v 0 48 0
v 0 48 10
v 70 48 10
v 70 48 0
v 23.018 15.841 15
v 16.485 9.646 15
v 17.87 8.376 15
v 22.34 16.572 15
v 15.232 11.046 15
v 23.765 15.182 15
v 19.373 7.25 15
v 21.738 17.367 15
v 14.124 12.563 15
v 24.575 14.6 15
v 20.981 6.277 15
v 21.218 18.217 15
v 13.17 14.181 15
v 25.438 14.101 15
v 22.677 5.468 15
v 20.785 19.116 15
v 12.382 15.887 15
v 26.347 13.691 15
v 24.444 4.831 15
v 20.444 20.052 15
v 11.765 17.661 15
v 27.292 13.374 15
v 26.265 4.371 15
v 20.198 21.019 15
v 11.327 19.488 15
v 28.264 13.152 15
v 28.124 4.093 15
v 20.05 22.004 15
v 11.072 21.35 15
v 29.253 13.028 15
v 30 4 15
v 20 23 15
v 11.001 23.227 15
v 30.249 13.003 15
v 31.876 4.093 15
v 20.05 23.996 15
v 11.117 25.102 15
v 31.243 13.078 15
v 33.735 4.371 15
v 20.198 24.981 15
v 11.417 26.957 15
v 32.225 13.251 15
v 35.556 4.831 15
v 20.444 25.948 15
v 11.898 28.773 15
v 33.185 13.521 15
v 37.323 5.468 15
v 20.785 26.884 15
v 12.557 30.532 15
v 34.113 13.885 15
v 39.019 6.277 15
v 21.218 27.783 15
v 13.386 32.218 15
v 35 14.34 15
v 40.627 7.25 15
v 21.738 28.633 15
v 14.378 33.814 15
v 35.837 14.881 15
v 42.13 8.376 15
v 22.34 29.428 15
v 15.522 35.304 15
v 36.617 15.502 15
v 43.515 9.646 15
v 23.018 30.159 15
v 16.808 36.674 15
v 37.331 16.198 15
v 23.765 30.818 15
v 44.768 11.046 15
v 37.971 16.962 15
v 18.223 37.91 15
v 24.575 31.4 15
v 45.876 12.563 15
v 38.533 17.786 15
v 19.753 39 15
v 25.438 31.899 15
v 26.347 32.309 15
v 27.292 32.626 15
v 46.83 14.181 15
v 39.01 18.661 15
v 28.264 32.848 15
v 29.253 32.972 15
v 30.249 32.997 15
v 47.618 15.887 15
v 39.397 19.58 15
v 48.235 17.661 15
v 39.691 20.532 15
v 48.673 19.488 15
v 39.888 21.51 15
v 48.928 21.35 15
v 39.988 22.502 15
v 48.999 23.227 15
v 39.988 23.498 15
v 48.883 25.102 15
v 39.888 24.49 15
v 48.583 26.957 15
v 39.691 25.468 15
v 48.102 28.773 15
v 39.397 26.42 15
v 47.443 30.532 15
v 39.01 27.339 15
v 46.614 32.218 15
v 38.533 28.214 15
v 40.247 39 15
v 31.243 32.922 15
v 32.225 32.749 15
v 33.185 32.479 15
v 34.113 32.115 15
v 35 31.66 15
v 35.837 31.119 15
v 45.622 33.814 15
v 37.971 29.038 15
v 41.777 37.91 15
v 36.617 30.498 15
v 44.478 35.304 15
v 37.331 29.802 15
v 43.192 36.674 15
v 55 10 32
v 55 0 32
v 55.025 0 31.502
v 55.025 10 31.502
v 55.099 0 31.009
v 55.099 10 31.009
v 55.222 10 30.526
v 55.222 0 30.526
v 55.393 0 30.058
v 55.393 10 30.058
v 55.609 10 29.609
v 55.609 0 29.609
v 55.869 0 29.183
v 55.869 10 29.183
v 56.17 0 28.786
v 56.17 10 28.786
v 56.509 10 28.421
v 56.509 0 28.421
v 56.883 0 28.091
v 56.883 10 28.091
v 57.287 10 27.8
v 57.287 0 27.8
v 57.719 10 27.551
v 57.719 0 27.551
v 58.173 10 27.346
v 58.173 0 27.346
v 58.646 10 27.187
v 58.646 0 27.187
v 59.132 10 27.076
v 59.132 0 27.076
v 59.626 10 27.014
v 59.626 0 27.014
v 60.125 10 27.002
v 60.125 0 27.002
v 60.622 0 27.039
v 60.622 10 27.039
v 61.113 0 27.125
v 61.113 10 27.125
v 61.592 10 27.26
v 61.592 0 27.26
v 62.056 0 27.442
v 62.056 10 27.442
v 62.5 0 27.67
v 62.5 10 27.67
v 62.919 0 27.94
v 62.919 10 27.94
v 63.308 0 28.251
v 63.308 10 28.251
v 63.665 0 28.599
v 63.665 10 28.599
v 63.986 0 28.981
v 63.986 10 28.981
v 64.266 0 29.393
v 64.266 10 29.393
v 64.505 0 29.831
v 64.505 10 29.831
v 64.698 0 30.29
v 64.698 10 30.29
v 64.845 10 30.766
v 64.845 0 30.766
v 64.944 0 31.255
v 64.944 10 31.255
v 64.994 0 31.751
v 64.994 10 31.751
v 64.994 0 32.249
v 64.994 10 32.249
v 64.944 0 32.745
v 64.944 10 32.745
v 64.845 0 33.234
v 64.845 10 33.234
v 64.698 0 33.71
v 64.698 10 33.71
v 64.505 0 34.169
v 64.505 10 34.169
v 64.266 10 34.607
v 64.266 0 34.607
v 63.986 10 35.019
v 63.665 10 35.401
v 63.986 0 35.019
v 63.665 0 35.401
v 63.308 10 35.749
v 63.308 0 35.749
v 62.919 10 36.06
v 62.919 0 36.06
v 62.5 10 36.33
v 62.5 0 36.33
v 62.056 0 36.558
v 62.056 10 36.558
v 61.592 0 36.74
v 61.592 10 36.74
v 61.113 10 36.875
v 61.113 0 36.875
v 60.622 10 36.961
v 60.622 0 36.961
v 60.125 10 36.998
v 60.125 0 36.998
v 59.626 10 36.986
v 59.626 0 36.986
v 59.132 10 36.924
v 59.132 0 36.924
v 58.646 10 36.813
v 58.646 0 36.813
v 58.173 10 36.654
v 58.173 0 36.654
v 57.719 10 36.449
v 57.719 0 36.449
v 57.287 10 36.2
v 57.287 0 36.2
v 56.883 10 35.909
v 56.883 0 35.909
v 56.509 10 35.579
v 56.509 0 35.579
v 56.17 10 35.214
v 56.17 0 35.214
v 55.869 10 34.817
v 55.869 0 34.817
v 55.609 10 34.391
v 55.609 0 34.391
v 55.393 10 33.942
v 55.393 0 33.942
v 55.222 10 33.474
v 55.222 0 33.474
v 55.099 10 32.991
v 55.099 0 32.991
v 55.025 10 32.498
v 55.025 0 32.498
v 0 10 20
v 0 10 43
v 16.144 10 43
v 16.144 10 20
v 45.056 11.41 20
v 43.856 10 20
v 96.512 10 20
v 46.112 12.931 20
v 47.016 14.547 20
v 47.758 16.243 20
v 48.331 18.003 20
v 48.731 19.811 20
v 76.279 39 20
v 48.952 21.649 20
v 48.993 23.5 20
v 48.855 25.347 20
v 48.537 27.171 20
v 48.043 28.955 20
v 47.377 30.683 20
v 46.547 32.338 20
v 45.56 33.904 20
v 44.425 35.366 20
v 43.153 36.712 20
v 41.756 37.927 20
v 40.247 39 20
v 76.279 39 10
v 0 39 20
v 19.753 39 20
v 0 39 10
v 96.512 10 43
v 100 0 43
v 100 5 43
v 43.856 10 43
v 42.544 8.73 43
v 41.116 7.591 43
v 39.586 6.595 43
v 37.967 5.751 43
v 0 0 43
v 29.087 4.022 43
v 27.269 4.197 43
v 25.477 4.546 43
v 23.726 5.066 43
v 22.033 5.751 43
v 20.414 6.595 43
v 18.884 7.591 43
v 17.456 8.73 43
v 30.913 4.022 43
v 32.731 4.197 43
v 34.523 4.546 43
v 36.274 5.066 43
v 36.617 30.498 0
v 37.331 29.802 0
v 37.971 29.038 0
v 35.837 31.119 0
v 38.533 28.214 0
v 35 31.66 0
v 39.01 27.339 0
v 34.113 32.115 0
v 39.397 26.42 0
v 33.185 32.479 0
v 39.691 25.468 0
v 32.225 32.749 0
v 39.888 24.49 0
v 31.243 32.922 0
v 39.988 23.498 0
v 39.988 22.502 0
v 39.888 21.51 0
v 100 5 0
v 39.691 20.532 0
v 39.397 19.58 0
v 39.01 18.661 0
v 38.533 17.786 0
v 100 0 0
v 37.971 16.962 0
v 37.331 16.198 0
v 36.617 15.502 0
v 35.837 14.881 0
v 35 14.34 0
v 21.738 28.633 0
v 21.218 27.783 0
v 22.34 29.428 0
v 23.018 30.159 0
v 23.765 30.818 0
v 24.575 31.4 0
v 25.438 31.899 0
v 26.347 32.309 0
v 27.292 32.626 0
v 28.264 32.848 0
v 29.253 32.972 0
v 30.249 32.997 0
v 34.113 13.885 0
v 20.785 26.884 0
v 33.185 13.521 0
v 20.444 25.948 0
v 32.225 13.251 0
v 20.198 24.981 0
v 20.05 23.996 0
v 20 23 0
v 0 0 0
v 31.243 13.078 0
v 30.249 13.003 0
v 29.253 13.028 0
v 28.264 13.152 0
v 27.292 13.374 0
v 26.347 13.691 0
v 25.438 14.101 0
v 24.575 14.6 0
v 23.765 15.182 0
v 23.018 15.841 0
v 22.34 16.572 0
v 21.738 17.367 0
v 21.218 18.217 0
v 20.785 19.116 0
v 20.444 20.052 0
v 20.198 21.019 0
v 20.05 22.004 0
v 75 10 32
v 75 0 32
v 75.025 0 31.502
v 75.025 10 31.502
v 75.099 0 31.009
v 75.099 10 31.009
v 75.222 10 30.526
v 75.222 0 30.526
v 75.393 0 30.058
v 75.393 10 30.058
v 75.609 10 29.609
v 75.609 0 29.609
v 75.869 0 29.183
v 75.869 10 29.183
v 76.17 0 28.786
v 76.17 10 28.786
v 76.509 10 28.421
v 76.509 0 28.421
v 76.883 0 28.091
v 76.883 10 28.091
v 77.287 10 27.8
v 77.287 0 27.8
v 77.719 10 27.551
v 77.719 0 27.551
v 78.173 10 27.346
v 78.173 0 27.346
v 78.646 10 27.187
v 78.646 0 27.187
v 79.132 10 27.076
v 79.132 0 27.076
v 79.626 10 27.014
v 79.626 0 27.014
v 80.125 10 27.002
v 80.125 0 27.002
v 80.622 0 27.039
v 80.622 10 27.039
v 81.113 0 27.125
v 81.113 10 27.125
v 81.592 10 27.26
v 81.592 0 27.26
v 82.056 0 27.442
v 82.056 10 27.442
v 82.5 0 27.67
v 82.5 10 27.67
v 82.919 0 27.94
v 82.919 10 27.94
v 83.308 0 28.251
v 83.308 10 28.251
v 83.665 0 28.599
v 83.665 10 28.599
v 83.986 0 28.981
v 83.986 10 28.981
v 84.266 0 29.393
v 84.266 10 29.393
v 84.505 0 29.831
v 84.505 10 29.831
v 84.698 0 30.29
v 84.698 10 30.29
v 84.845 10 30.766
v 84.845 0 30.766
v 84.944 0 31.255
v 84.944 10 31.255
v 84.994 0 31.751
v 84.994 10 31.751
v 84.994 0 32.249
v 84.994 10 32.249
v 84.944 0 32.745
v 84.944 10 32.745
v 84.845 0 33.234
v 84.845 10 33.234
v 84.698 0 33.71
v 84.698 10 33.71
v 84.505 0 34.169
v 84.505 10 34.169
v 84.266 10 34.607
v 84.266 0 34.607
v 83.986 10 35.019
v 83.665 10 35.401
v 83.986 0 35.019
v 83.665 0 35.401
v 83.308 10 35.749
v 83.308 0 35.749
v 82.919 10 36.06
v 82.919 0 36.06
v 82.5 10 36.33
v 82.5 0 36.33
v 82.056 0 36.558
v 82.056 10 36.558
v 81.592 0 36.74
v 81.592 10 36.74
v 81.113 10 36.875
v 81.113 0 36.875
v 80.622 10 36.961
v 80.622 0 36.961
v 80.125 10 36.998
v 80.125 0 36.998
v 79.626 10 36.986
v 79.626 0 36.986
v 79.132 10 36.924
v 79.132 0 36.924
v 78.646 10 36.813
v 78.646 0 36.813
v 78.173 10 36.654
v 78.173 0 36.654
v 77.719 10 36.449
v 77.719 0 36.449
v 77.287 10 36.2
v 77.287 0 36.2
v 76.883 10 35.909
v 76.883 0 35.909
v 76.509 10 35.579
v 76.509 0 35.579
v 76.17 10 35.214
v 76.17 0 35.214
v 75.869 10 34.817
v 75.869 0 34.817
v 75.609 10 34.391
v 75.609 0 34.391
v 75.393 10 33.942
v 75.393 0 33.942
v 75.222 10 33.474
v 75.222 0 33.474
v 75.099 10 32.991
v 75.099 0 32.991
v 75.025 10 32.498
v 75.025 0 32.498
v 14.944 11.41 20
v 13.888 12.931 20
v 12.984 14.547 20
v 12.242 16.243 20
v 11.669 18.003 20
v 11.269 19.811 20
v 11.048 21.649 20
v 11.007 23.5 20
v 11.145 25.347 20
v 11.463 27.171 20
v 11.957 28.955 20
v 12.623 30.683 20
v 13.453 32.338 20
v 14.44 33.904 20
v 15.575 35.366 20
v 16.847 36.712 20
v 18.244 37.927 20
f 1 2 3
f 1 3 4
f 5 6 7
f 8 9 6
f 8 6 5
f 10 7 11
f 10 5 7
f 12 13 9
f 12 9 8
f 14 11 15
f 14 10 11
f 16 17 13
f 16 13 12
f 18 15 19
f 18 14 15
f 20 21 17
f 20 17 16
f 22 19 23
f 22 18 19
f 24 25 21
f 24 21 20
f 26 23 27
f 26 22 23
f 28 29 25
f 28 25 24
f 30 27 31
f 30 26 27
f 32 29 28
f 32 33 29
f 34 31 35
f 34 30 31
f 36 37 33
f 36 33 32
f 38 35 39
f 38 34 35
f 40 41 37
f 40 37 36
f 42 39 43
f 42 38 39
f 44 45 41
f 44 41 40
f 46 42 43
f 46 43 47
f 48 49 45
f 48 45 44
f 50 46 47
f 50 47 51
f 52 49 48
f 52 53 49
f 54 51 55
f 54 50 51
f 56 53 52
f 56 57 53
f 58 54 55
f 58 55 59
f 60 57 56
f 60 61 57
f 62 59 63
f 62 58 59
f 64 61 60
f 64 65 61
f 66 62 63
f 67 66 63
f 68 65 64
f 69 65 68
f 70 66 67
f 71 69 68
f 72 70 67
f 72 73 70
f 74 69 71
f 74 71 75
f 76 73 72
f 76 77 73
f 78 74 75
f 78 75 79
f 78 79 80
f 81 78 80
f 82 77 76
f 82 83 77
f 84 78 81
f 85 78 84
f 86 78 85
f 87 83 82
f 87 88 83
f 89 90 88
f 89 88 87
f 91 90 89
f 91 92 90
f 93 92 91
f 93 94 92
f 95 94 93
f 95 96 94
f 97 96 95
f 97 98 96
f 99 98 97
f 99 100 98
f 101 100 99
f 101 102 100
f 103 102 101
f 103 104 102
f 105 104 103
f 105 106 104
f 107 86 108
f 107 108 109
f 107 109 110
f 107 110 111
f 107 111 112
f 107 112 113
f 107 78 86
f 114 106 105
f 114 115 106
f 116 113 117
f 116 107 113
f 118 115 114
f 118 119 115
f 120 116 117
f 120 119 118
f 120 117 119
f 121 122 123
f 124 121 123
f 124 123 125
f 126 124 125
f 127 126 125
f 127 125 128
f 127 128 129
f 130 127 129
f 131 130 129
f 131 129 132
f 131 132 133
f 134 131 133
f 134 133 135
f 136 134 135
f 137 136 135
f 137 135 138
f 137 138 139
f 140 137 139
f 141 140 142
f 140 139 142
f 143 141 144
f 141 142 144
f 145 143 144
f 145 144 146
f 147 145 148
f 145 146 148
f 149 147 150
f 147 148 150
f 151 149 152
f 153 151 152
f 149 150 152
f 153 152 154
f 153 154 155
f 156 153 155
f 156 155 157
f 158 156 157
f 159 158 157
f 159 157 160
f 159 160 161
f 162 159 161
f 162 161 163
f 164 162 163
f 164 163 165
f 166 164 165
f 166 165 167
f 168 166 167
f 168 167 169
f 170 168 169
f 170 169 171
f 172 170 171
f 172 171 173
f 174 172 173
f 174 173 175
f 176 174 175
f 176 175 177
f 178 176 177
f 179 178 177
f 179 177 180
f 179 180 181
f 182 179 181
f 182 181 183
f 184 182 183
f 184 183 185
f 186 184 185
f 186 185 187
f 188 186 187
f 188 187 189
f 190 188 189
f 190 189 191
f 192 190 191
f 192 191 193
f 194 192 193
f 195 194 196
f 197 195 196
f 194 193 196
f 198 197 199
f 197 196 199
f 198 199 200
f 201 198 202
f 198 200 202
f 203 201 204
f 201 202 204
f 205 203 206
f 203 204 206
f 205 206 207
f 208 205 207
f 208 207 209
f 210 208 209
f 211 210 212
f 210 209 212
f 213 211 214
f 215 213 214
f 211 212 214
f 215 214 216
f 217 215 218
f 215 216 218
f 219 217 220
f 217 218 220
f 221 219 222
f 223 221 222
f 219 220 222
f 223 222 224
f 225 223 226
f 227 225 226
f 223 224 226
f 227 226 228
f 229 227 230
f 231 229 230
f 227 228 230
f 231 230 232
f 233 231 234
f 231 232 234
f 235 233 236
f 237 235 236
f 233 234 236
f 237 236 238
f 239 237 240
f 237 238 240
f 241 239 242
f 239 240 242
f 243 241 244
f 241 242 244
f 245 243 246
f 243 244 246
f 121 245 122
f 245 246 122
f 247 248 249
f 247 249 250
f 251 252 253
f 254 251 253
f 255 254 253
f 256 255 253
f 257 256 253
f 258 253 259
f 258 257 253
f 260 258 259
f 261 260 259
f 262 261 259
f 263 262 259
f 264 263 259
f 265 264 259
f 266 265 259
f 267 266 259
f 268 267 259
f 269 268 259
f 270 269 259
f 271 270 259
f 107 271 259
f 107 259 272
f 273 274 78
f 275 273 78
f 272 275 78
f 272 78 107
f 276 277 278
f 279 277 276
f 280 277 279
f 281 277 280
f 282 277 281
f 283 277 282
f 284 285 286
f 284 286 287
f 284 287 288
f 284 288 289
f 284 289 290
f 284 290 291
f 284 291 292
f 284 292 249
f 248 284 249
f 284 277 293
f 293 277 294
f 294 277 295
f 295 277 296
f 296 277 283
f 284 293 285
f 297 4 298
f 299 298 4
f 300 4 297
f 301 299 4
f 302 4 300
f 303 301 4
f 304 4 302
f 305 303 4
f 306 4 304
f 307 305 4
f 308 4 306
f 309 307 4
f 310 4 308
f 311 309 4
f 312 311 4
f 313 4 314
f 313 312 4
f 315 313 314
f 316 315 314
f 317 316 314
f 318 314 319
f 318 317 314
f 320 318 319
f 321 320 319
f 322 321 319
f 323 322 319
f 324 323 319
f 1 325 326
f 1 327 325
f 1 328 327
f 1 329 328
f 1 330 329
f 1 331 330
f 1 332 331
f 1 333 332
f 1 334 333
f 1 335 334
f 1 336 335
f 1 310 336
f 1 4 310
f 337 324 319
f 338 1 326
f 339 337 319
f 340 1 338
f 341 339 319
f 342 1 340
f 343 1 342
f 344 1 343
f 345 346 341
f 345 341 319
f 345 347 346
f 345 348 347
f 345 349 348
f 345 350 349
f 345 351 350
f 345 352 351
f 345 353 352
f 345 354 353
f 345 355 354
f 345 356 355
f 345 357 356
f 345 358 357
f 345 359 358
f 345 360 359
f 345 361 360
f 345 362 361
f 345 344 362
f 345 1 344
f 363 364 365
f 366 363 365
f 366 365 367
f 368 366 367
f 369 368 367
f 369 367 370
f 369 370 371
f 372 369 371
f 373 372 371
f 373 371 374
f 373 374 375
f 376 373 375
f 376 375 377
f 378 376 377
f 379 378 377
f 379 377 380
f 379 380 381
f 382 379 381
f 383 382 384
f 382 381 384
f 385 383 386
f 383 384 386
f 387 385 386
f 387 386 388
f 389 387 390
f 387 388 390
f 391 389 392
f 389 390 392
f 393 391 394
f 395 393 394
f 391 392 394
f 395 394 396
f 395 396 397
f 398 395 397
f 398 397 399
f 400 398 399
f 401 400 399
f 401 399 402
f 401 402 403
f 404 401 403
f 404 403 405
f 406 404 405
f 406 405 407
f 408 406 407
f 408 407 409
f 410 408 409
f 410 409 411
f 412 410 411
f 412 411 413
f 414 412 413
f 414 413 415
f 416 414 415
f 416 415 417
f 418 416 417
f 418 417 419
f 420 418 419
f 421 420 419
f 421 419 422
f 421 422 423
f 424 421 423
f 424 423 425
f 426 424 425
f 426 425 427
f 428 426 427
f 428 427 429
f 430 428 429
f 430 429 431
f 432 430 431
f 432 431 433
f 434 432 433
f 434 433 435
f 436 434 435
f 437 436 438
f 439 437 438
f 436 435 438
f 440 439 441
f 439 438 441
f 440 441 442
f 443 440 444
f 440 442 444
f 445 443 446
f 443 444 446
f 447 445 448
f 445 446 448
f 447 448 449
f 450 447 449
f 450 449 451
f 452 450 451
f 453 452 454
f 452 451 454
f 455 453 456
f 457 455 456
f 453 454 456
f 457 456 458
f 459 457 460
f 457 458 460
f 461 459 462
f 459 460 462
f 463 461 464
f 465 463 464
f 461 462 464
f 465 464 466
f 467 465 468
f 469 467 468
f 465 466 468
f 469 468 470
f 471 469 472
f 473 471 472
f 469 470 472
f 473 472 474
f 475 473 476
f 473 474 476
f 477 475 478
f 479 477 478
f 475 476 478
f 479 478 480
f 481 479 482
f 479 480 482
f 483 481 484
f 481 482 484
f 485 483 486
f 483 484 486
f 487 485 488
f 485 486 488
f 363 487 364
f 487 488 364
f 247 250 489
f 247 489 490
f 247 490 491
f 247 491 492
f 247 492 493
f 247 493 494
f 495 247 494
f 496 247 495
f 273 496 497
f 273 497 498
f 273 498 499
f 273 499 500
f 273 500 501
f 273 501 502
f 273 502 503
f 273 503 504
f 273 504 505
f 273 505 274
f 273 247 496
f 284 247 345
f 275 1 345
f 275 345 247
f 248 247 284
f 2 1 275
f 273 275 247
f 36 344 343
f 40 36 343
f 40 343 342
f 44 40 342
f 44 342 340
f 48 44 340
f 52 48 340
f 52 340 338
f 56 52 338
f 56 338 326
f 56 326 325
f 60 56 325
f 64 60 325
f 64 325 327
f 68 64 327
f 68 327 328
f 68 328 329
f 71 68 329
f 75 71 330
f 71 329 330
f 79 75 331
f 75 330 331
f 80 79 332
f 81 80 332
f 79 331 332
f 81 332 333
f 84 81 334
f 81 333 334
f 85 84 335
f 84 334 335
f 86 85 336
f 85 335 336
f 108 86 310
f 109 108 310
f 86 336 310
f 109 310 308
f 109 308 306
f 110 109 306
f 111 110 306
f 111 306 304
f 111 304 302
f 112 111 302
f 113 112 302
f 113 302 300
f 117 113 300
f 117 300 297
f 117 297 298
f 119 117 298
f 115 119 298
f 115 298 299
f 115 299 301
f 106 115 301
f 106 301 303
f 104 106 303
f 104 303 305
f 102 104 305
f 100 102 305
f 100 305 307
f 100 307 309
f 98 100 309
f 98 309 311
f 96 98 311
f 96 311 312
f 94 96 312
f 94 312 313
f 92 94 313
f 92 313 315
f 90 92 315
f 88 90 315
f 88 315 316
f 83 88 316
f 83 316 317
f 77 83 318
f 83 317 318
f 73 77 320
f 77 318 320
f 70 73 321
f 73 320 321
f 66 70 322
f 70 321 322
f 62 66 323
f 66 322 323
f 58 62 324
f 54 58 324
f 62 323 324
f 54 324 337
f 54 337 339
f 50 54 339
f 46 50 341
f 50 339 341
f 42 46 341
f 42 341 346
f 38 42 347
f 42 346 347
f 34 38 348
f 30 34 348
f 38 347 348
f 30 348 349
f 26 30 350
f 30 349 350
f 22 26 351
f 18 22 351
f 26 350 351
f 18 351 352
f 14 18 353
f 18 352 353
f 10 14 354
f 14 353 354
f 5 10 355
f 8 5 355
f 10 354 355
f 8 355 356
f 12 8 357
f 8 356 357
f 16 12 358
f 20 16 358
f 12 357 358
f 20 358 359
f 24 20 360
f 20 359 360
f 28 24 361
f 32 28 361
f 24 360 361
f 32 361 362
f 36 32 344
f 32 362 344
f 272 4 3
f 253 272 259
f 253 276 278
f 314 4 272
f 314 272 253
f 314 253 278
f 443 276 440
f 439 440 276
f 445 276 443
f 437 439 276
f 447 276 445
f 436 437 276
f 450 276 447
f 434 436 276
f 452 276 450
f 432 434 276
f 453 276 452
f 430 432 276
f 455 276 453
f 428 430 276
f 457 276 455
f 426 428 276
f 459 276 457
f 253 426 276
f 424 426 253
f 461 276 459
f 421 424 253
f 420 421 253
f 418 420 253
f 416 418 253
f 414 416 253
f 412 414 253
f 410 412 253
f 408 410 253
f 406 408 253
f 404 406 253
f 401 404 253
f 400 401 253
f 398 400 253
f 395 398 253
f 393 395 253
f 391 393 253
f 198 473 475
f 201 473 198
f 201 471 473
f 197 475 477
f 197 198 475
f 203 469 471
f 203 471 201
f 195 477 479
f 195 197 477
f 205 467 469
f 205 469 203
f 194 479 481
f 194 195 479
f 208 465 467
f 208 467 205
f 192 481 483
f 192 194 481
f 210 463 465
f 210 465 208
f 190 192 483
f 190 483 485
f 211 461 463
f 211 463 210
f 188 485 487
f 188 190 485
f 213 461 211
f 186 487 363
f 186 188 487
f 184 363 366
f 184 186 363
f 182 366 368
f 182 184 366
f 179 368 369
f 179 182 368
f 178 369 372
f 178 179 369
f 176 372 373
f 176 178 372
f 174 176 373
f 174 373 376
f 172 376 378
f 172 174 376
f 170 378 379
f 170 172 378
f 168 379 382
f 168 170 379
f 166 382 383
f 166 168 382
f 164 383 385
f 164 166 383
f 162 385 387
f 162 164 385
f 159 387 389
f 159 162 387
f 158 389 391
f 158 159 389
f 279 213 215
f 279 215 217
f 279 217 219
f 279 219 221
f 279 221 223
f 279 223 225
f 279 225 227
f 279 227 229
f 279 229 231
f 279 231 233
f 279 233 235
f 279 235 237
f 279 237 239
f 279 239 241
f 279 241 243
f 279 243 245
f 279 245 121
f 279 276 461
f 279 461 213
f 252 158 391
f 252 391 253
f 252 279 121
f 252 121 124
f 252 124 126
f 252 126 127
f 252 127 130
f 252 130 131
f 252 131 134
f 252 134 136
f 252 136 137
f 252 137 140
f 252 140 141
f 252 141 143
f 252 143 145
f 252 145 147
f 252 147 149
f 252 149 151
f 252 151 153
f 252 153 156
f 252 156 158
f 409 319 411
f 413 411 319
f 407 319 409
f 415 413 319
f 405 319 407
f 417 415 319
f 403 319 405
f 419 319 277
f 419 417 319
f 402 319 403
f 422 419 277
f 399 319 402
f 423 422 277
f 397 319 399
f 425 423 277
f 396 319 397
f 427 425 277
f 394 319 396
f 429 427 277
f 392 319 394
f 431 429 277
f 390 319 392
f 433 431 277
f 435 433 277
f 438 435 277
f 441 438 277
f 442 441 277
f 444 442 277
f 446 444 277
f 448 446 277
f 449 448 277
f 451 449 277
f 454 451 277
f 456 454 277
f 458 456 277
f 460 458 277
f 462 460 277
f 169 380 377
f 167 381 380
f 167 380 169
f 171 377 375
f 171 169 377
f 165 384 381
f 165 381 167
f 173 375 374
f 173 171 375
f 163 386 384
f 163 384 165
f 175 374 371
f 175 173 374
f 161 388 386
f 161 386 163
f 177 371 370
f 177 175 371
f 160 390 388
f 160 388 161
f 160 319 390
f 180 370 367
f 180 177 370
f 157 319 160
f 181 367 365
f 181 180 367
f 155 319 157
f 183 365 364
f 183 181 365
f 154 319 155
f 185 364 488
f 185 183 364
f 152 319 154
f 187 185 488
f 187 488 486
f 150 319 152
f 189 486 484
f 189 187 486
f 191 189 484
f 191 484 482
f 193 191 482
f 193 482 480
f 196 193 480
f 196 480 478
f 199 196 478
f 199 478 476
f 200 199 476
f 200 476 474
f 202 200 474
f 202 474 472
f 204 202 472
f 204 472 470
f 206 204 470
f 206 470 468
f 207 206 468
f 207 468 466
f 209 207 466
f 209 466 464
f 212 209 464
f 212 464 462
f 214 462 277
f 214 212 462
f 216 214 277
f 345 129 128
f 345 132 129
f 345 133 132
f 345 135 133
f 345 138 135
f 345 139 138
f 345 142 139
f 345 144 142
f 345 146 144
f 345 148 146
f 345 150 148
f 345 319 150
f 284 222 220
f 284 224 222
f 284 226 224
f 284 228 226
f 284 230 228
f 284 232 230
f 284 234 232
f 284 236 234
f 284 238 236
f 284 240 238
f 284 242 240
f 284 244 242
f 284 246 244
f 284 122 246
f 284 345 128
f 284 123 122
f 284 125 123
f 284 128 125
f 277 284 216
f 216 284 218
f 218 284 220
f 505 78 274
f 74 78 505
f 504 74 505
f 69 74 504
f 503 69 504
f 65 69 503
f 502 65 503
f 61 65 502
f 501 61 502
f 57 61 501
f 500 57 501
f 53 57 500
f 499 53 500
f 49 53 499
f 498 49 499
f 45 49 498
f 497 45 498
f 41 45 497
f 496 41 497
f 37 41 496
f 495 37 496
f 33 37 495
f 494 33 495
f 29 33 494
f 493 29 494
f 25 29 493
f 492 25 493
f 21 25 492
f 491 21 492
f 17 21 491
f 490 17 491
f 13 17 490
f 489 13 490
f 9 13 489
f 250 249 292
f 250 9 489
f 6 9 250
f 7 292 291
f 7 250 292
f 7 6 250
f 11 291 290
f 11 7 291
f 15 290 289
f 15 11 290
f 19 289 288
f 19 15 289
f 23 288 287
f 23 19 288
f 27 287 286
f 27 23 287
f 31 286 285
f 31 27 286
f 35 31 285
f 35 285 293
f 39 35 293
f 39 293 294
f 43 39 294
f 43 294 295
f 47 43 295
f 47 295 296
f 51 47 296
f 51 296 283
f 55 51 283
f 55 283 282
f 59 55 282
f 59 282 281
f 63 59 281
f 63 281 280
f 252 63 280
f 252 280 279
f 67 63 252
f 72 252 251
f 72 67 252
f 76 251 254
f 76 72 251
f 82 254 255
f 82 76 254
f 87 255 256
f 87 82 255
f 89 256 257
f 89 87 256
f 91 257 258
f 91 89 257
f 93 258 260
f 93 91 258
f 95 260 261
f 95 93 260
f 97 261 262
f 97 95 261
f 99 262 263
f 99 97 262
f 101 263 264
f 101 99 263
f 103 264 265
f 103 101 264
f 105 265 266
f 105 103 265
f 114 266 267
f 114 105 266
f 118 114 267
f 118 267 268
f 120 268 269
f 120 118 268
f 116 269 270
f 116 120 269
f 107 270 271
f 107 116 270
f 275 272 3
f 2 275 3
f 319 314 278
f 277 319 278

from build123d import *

# Parameters (mm, degrees)
ESTRUSIONE_ESTRUSIONE1_DEPTH  = 100
TAGLIO_ESTRUSIONE1_DEPTH      = 119.966381806
TAGLIO_ESTRUSIONE1_DEPTH_BACK = 119.966381806
TAGLIO_ESTRUSIONE2_DEPTH      = 142.966381806
TAGLIO_ESTRUSIONE2_DEPTH_BACK = 5
TAGLIO_ESTRUSIONE2_START      = -23
SCHIZZO3_R                    = 19
FORO_20_0_20_1_D              = 20
FORO_10_0_10_1_D              = 10


with BuildPart() as part:
    # Schizzo1 → Estrusione-Estrusione1 (new body)
    with BuildSketch(Plane(origin=(0, 0, 0), x_dir=(0, 0, -1), z_dir=(1, 0, 0))):
        Polygon((0, 48), (0, 0), (-43, 0), (-43, 10), (-20, 10), (-20, 39), (-10, 39), (-10, 48), align=None)
    extrude(amount=ESTRUSIONE_ESTRUSIONE1_DEPTH)

    # Schizzo2 → Taglio-Estrusione1 (cut, two sides: drawn at the far end of the back side and taken through both)
    with BuildSketch(Plane.XY.offset(-TAGLIO_ESTRUSIONE1_DEPTH_BACK)):
        Polygon((-60.289310715, 234.748012024), (70, 48), (100, 5), (230.289310715, -181.748012024), (603.785334763, 78.830609405), (313.206713334, 495.326633453), align=None)
    extrude(amount=TAGLIO_ESTRUSIONE1_DEPTH + TAGLIO_ESTRUSIONE1_DEPTH_BACK, mode=Mode.SUBTRACT)

    # Schizzo3 → Taglio-Estrusione2 (cut, two sides: drawn at the far end of the back side and taken through both)
    with BuildSketch(Plane.XY.offset(43).offset(TAGLIO_ESTRUSIONE2_START - TAGLIO_ESTRUSIONE2_DEPTH_BACK)):
        with Locations((30, 23)):
            Circle(SCHIZZO3_R)
    extrude(amount=TAGLIO_ESTRUSIONE2_DEPTH + TAGLIO_ESTRUSIONE2_DEPTH_BACK, mode=Mode.SUBTRACT)

    # Foro Ø20.0 (20)-1 (through all)
    with Locations(Plane.XY.offset(15)):
        with Locations((30, 23)):
            Hole(FORO_20_0_20_1_D / 2)

    # Foro Ø10.0 (10)-1 (through all)
    with Locations(Plane(origin=(0, 10, 0), x_dir=(1, 0, 0), z_dir=(0, 1, 0))):
        with Locations((80, -32), (60, -32)):
            Hole(FORO_10_0_10_1_D / 2)


solid = part.part
